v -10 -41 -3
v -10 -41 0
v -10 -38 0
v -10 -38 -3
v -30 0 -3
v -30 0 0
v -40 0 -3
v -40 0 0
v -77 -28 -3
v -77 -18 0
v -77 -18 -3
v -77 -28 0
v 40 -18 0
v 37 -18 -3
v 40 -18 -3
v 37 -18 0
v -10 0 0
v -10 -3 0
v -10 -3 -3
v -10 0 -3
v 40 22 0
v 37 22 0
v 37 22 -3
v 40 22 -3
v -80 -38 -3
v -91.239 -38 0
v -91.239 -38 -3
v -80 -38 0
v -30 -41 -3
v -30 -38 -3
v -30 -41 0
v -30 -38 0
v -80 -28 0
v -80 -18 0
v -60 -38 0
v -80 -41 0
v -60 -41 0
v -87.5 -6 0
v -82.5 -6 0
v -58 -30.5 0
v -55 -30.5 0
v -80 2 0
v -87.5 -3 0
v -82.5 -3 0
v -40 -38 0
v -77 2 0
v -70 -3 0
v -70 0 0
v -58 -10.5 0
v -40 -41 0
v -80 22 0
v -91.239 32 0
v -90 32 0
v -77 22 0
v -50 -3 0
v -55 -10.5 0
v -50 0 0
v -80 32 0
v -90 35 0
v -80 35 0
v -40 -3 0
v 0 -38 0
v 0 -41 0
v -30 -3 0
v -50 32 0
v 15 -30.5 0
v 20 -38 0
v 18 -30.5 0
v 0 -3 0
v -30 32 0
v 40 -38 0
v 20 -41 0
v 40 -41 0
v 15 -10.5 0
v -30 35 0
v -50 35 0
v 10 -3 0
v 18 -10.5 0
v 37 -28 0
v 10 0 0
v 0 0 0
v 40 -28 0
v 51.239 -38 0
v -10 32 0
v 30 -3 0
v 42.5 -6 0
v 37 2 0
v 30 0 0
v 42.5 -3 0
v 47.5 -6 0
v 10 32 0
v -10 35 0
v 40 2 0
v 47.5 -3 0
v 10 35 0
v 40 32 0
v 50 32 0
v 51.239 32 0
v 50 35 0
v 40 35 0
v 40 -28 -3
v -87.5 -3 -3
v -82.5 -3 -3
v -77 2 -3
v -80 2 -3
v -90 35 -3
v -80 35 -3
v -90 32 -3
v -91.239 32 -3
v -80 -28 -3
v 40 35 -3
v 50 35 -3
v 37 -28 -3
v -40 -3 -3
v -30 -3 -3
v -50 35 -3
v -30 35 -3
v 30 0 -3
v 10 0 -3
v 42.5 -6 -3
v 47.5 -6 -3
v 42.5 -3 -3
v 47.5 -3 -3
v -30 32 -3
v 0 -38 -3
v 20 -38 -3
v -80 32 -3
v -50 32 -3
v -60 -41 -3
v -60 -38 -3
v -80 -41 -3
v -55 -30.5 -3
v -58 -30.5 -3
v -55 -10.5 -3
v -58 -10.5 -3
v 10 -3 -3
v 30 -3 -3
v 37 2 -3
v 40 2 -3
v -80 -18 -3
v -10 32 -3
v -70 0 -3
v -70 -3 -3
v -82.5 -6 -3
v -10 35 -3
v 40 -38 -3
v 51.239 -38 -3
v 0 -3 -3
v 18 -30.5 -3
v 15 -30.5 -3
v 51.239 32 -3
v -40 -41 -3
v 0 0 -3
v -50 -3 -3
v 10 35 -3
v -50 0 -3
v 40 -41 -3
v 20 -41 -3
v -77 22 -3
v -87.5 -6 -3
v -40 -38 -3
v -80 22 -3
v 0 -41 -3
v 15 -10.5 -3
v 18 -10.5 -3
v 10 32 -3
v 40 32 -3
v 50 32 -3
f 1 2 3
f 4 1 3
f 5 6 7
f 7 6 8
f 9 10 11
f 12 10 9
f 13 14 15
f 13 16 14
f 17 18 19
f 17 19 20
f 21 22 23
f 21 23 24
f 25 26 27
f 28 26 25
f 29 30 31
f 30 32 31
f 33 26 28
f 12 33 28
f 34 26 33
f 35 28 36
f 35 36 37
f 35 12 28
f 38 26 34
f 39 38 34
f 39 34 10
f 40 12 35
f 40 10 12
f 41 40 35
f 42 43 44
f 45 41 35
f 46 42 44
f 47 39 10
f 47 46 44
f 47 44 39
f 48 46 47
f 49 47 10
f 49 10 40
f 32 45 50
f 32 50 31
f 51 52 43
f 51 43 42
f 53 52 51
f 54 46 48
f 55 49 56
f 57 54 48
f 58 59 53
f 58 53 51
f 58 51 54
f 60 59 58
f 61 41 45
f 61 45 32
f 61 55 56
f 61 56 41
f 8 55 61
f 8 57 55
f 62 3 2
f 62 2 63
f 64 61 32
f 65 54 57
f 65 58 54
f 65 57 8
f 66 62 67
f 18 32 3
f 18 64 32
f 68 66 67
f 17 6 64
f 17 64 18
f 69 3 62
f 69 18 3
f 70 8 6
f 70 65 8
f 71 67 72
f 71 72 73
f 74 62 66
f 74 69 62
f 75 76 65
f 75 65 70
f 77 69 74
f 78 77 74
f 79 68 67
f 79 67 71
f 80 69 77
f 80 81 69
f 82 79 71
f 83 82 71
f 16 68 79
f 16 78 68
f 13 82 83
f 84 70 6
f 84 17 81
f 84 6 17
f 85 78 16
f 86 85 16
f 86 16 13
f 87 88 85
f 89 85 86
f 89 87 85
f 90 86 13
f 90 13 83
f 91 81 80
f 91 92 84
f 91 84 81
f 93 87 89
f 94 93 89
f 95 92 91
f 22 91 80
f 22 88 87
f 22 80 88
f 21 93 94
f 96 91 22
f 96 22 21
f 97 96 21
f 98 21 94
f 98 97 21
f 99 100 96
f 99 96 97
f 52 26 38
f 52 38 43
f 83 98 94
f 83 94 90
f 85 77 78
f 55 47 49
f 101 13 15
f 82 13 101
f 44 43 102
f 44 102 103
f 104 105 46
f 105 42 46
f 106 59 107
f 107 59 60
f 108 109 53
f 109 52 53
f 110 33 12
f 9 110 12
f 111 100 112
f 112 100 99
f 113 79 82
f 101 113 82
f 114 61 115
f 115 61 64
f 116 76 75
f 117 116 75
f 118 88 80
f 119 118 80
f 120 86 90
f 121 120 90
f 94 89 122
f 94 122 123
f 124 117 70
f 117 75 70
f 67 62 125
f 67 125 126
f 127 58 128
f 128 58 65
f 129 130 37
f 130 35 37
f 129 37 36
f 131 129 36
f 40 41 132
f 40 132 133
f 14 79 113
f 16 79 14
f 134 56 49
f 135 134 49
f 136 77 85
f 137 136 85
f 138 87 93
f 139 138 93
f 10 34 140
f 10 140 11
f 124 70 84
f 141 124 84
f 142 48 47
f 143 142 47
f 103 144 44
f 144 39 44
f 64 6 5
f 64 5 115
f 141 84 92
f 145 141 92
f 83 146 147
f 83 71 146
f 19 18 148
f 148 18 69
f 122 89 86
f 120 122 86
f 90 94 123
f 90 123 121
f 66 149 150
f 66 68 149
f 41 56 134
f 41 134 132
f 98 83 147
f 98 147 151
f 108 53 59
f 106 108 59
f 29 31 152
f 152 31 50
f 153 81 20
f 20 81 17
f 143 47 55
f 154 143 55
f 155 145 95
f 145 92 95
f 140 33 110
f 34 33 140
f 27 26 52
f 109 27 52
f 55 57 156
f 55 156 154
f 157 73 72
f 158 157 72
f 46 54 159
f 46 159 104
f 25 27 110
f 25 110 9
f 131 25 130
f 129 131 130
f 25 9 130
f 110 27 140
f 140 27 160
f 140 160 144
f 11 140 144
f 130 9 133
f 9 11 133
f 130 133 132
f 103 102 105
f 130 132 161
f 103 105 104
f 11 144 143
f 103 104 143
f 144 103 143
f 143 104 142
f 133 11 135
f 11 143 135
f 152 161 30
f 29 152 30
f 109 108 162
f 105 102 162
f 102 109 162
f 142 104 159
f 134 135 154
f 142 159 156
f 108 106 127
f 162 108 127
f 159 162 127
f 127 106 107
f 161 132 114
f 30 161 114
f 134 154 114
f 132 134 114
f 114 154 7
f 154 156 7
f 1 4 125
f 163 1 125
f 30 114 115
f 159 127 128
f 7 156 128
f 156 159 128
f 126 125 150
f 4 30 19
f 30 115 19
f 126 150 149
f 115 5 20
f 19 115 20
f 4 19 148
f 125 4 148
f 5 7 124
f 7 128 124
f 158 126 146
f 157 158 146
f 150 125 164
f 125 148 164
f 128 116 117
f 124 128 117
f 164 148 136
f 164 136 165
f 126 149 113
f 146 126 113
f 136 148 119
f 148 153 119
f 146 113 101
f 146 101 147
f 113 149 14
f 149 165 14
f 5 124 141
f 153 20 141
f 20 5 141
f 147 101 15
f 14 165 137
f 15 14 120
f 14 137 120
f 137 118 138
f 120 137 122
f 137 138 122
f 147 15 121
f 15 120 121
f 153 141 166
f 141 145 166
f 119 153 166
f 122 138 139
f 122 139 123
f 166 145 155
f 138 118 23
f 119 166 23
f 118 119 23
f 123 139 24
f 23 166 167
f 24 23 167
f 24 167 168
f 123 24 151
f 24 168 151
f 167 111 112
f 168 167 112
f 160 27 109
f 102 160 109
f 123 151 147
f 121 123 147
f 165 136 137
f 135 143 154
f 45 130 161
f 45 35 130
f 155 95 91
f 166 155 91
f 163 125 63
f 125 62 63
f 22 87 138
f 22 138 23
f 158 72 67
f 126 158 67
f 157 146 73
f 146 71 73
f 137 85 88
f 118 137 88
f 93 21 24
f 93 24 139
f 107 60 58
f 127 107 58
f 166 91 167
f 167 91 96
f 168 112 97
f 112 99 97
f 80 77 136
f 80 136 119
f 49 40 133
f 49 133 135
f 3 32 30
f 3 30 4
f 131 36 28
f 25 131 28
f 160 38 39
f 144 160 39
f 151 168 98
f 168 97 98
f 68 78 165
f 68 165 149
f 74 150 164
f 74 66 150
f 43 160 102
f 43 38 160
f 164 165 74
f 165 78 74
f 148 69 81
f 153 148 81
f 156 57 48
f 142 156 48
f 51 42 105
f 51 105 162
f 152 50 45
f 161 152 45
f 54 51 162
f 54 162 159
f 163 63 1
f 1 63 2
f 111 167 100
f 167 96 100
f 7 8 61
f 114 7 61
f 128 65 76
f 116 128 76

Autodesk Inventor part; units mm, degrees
ref_plane "YZ Plane" through (0, 0, 0) normal (1, 0, 0) x (0, 1, 0)
ref_plane "XZ Plane" through (0, 0, 0) normal (0, 1, 0) x (-1, 0, 0)
ref_plane "XY Plane" through (0, 0, 0) normal (0, 0, 1) x (1, 0, 0)
sketch "Sketch1" plane through (0, 0, 0) normal (0, 0, 1) x (1, 0, 0)
  line L0 (-91.239, 32) -> (-91.239, 35) projected
  line L1 (51.239, 32) -> (51.239, 35) projected
  line L2 (51.239, -41) -> (51.239, -38) projected
  line L3 (-91.239, 35) -> (51.239, 35)
  line L4 (51.239, 35) -> (51.239, -41)
  line L5 (51.239, -41) -> (-91.239, -41)
  line L6 (-91.239, -41) -> (-91.239, 35)
  point P0 (0, 0)
extrude "Extrusion1" add sketch "Sketch1" against normal blind 3
sketch "Sketch2" plane through (0, 0, 0) normal (0, 0, 1) x (1, 0, 0)
  line L0 (-80, 35) -> (-80, 32) projected
  line L1 (-80, 32) -> (-50, 32) projected
  line L2 (-50, 32) -> (-50, 35) projected
  line L3 (-80, 35) -> (-50, 35) projected
  line L4 (-10, 32) -> (-10, 35) projected
  line L5 (-30, 35) -> (-10, 35) projected
  line L6 (-30, 35) -> (-30, 32) projected
  line L7 (-30, 32) -> (-10, 32) projected
  line L8 (-50, 0) -> (-70, 0) projected
  line L9 (-70, 0) -> (-70, -3) projected
  line L10 (-70, -3) -> (-50, -3) projected
  line L11 (-50, 0) -> (-50, -3) projected
  line L12 (-30, 0) -> (-40, 0) projected
  line L13 (-40, 0) -> (-40, -3) projected
  line L14 (-40, -3) -> (-30, -3) projected
  line L15 (-30, 0) -> (-30, -3) projected
  line L16 (-80, -28) -> (-80, -18) projected
  line L17 (-80, -28) -> (-77, -28) projected
  line L18 (-77, -18) -> (-77, -28) projected
  line L19 (-80, -18) -> (-77, -18) projected
  line L20 (-80, 2) -> (-80, 22) projected
  line L21 (-80, 2) -> (-77, 2) projected
  line L22 (-77, 22) -> (-77, 2) projected
  line L23 (-80, 22) -> (-77, 22) projected
  line L24 (-80, -41) -> (-80, -38) projected
  line L25 (-91.239, -38) -> (-80, -38) projected
  line L26 (-91.239, -41) -> (-91.239, -38) projected
  line L27 (-91.239, -41) -> (-80, -41) projected
  line L28 (-40, -41) -> (-40, -38) projected
  line L29 (-60, -38) -> (-40, -38) projected
  line L30 (-60, -38) -> (-60, -41) projected
  line L31 (-60, -41) -> (-40, -41) projected
  line L32 (-10, -41) -> (-10, -38) projected
  line L33 (-30, -38) -> (-10, -38) projected
  line L34 (-30, -38) -> (-30, -41) projected
  line L35 (-30, -41) -> (-10, -41) projected
  point P0 (0, 0)
extrude "Extrusion2" cut sketch "Sketch2" against normal blind 3 contours L3 L2 L1 L0 | L7 L6 L5 L4 | L11 L10 L9 L8 | L15 L14 L13 L12 | L20 L23 L22 L21 | L27 L26 L25 L24 | L31 L30 L29 L28 | L35 L34 L33 L32
sketch "Sketch3" plane through (0, 0, 0) normal (0, 0, 1) x (1, 0, 0)
  line L0 (-90, 32) -> (-90, 35) projected
  line L1 (-91.239, 35) -> (-90, 35) projected
  line L2 (-91.239, 32) -> (-91.239, 35) projected
  line L3 (-91.239, 32) -> (-90, 32) projected
  line L4 (-87.5, -3) -> (-82.5, -3) projected
  line L5 (-87.5, -6) -> (-82.5, -6) projected
  line L6 (-82.5, -6) -> (-82.5, -3) projected
  line L7 (-87.5, -6) -> (-87.5, -3) projected
  line L8 (-77, -18) -> (-77, -28) projected
  line L9 (-80, -28) -> (-80, -18) projected
  line L10 (-80, -18) -> (-77, -18) projected
  line L11 (-80, -28) -> (-77, -28) projected
  line L12 (-55, -10.5) -> (-55, -30.5) projected
  line L13 (-55, -10.5) -> (-58, -10.5) projected
  line L14 (-58, -30.5) -> (-58, -10.5) projected
  line L15 (-55, -30.5) -> (-58, -30.5) projected
  point P0 (0, 0)
extrude "Extrusion3" cut sketch "Sketch3" against normal blind 3
ref_plane "Work Plane1" through (-20, -41, 0) normal (1, 0, 0) x (0, 0, -1)
mirror "Mirror1" about plane through (-20, -41, 0) normal (1, 0, 0) of "Extrusion3", "Extrusion2"
properties part number "Frount"
